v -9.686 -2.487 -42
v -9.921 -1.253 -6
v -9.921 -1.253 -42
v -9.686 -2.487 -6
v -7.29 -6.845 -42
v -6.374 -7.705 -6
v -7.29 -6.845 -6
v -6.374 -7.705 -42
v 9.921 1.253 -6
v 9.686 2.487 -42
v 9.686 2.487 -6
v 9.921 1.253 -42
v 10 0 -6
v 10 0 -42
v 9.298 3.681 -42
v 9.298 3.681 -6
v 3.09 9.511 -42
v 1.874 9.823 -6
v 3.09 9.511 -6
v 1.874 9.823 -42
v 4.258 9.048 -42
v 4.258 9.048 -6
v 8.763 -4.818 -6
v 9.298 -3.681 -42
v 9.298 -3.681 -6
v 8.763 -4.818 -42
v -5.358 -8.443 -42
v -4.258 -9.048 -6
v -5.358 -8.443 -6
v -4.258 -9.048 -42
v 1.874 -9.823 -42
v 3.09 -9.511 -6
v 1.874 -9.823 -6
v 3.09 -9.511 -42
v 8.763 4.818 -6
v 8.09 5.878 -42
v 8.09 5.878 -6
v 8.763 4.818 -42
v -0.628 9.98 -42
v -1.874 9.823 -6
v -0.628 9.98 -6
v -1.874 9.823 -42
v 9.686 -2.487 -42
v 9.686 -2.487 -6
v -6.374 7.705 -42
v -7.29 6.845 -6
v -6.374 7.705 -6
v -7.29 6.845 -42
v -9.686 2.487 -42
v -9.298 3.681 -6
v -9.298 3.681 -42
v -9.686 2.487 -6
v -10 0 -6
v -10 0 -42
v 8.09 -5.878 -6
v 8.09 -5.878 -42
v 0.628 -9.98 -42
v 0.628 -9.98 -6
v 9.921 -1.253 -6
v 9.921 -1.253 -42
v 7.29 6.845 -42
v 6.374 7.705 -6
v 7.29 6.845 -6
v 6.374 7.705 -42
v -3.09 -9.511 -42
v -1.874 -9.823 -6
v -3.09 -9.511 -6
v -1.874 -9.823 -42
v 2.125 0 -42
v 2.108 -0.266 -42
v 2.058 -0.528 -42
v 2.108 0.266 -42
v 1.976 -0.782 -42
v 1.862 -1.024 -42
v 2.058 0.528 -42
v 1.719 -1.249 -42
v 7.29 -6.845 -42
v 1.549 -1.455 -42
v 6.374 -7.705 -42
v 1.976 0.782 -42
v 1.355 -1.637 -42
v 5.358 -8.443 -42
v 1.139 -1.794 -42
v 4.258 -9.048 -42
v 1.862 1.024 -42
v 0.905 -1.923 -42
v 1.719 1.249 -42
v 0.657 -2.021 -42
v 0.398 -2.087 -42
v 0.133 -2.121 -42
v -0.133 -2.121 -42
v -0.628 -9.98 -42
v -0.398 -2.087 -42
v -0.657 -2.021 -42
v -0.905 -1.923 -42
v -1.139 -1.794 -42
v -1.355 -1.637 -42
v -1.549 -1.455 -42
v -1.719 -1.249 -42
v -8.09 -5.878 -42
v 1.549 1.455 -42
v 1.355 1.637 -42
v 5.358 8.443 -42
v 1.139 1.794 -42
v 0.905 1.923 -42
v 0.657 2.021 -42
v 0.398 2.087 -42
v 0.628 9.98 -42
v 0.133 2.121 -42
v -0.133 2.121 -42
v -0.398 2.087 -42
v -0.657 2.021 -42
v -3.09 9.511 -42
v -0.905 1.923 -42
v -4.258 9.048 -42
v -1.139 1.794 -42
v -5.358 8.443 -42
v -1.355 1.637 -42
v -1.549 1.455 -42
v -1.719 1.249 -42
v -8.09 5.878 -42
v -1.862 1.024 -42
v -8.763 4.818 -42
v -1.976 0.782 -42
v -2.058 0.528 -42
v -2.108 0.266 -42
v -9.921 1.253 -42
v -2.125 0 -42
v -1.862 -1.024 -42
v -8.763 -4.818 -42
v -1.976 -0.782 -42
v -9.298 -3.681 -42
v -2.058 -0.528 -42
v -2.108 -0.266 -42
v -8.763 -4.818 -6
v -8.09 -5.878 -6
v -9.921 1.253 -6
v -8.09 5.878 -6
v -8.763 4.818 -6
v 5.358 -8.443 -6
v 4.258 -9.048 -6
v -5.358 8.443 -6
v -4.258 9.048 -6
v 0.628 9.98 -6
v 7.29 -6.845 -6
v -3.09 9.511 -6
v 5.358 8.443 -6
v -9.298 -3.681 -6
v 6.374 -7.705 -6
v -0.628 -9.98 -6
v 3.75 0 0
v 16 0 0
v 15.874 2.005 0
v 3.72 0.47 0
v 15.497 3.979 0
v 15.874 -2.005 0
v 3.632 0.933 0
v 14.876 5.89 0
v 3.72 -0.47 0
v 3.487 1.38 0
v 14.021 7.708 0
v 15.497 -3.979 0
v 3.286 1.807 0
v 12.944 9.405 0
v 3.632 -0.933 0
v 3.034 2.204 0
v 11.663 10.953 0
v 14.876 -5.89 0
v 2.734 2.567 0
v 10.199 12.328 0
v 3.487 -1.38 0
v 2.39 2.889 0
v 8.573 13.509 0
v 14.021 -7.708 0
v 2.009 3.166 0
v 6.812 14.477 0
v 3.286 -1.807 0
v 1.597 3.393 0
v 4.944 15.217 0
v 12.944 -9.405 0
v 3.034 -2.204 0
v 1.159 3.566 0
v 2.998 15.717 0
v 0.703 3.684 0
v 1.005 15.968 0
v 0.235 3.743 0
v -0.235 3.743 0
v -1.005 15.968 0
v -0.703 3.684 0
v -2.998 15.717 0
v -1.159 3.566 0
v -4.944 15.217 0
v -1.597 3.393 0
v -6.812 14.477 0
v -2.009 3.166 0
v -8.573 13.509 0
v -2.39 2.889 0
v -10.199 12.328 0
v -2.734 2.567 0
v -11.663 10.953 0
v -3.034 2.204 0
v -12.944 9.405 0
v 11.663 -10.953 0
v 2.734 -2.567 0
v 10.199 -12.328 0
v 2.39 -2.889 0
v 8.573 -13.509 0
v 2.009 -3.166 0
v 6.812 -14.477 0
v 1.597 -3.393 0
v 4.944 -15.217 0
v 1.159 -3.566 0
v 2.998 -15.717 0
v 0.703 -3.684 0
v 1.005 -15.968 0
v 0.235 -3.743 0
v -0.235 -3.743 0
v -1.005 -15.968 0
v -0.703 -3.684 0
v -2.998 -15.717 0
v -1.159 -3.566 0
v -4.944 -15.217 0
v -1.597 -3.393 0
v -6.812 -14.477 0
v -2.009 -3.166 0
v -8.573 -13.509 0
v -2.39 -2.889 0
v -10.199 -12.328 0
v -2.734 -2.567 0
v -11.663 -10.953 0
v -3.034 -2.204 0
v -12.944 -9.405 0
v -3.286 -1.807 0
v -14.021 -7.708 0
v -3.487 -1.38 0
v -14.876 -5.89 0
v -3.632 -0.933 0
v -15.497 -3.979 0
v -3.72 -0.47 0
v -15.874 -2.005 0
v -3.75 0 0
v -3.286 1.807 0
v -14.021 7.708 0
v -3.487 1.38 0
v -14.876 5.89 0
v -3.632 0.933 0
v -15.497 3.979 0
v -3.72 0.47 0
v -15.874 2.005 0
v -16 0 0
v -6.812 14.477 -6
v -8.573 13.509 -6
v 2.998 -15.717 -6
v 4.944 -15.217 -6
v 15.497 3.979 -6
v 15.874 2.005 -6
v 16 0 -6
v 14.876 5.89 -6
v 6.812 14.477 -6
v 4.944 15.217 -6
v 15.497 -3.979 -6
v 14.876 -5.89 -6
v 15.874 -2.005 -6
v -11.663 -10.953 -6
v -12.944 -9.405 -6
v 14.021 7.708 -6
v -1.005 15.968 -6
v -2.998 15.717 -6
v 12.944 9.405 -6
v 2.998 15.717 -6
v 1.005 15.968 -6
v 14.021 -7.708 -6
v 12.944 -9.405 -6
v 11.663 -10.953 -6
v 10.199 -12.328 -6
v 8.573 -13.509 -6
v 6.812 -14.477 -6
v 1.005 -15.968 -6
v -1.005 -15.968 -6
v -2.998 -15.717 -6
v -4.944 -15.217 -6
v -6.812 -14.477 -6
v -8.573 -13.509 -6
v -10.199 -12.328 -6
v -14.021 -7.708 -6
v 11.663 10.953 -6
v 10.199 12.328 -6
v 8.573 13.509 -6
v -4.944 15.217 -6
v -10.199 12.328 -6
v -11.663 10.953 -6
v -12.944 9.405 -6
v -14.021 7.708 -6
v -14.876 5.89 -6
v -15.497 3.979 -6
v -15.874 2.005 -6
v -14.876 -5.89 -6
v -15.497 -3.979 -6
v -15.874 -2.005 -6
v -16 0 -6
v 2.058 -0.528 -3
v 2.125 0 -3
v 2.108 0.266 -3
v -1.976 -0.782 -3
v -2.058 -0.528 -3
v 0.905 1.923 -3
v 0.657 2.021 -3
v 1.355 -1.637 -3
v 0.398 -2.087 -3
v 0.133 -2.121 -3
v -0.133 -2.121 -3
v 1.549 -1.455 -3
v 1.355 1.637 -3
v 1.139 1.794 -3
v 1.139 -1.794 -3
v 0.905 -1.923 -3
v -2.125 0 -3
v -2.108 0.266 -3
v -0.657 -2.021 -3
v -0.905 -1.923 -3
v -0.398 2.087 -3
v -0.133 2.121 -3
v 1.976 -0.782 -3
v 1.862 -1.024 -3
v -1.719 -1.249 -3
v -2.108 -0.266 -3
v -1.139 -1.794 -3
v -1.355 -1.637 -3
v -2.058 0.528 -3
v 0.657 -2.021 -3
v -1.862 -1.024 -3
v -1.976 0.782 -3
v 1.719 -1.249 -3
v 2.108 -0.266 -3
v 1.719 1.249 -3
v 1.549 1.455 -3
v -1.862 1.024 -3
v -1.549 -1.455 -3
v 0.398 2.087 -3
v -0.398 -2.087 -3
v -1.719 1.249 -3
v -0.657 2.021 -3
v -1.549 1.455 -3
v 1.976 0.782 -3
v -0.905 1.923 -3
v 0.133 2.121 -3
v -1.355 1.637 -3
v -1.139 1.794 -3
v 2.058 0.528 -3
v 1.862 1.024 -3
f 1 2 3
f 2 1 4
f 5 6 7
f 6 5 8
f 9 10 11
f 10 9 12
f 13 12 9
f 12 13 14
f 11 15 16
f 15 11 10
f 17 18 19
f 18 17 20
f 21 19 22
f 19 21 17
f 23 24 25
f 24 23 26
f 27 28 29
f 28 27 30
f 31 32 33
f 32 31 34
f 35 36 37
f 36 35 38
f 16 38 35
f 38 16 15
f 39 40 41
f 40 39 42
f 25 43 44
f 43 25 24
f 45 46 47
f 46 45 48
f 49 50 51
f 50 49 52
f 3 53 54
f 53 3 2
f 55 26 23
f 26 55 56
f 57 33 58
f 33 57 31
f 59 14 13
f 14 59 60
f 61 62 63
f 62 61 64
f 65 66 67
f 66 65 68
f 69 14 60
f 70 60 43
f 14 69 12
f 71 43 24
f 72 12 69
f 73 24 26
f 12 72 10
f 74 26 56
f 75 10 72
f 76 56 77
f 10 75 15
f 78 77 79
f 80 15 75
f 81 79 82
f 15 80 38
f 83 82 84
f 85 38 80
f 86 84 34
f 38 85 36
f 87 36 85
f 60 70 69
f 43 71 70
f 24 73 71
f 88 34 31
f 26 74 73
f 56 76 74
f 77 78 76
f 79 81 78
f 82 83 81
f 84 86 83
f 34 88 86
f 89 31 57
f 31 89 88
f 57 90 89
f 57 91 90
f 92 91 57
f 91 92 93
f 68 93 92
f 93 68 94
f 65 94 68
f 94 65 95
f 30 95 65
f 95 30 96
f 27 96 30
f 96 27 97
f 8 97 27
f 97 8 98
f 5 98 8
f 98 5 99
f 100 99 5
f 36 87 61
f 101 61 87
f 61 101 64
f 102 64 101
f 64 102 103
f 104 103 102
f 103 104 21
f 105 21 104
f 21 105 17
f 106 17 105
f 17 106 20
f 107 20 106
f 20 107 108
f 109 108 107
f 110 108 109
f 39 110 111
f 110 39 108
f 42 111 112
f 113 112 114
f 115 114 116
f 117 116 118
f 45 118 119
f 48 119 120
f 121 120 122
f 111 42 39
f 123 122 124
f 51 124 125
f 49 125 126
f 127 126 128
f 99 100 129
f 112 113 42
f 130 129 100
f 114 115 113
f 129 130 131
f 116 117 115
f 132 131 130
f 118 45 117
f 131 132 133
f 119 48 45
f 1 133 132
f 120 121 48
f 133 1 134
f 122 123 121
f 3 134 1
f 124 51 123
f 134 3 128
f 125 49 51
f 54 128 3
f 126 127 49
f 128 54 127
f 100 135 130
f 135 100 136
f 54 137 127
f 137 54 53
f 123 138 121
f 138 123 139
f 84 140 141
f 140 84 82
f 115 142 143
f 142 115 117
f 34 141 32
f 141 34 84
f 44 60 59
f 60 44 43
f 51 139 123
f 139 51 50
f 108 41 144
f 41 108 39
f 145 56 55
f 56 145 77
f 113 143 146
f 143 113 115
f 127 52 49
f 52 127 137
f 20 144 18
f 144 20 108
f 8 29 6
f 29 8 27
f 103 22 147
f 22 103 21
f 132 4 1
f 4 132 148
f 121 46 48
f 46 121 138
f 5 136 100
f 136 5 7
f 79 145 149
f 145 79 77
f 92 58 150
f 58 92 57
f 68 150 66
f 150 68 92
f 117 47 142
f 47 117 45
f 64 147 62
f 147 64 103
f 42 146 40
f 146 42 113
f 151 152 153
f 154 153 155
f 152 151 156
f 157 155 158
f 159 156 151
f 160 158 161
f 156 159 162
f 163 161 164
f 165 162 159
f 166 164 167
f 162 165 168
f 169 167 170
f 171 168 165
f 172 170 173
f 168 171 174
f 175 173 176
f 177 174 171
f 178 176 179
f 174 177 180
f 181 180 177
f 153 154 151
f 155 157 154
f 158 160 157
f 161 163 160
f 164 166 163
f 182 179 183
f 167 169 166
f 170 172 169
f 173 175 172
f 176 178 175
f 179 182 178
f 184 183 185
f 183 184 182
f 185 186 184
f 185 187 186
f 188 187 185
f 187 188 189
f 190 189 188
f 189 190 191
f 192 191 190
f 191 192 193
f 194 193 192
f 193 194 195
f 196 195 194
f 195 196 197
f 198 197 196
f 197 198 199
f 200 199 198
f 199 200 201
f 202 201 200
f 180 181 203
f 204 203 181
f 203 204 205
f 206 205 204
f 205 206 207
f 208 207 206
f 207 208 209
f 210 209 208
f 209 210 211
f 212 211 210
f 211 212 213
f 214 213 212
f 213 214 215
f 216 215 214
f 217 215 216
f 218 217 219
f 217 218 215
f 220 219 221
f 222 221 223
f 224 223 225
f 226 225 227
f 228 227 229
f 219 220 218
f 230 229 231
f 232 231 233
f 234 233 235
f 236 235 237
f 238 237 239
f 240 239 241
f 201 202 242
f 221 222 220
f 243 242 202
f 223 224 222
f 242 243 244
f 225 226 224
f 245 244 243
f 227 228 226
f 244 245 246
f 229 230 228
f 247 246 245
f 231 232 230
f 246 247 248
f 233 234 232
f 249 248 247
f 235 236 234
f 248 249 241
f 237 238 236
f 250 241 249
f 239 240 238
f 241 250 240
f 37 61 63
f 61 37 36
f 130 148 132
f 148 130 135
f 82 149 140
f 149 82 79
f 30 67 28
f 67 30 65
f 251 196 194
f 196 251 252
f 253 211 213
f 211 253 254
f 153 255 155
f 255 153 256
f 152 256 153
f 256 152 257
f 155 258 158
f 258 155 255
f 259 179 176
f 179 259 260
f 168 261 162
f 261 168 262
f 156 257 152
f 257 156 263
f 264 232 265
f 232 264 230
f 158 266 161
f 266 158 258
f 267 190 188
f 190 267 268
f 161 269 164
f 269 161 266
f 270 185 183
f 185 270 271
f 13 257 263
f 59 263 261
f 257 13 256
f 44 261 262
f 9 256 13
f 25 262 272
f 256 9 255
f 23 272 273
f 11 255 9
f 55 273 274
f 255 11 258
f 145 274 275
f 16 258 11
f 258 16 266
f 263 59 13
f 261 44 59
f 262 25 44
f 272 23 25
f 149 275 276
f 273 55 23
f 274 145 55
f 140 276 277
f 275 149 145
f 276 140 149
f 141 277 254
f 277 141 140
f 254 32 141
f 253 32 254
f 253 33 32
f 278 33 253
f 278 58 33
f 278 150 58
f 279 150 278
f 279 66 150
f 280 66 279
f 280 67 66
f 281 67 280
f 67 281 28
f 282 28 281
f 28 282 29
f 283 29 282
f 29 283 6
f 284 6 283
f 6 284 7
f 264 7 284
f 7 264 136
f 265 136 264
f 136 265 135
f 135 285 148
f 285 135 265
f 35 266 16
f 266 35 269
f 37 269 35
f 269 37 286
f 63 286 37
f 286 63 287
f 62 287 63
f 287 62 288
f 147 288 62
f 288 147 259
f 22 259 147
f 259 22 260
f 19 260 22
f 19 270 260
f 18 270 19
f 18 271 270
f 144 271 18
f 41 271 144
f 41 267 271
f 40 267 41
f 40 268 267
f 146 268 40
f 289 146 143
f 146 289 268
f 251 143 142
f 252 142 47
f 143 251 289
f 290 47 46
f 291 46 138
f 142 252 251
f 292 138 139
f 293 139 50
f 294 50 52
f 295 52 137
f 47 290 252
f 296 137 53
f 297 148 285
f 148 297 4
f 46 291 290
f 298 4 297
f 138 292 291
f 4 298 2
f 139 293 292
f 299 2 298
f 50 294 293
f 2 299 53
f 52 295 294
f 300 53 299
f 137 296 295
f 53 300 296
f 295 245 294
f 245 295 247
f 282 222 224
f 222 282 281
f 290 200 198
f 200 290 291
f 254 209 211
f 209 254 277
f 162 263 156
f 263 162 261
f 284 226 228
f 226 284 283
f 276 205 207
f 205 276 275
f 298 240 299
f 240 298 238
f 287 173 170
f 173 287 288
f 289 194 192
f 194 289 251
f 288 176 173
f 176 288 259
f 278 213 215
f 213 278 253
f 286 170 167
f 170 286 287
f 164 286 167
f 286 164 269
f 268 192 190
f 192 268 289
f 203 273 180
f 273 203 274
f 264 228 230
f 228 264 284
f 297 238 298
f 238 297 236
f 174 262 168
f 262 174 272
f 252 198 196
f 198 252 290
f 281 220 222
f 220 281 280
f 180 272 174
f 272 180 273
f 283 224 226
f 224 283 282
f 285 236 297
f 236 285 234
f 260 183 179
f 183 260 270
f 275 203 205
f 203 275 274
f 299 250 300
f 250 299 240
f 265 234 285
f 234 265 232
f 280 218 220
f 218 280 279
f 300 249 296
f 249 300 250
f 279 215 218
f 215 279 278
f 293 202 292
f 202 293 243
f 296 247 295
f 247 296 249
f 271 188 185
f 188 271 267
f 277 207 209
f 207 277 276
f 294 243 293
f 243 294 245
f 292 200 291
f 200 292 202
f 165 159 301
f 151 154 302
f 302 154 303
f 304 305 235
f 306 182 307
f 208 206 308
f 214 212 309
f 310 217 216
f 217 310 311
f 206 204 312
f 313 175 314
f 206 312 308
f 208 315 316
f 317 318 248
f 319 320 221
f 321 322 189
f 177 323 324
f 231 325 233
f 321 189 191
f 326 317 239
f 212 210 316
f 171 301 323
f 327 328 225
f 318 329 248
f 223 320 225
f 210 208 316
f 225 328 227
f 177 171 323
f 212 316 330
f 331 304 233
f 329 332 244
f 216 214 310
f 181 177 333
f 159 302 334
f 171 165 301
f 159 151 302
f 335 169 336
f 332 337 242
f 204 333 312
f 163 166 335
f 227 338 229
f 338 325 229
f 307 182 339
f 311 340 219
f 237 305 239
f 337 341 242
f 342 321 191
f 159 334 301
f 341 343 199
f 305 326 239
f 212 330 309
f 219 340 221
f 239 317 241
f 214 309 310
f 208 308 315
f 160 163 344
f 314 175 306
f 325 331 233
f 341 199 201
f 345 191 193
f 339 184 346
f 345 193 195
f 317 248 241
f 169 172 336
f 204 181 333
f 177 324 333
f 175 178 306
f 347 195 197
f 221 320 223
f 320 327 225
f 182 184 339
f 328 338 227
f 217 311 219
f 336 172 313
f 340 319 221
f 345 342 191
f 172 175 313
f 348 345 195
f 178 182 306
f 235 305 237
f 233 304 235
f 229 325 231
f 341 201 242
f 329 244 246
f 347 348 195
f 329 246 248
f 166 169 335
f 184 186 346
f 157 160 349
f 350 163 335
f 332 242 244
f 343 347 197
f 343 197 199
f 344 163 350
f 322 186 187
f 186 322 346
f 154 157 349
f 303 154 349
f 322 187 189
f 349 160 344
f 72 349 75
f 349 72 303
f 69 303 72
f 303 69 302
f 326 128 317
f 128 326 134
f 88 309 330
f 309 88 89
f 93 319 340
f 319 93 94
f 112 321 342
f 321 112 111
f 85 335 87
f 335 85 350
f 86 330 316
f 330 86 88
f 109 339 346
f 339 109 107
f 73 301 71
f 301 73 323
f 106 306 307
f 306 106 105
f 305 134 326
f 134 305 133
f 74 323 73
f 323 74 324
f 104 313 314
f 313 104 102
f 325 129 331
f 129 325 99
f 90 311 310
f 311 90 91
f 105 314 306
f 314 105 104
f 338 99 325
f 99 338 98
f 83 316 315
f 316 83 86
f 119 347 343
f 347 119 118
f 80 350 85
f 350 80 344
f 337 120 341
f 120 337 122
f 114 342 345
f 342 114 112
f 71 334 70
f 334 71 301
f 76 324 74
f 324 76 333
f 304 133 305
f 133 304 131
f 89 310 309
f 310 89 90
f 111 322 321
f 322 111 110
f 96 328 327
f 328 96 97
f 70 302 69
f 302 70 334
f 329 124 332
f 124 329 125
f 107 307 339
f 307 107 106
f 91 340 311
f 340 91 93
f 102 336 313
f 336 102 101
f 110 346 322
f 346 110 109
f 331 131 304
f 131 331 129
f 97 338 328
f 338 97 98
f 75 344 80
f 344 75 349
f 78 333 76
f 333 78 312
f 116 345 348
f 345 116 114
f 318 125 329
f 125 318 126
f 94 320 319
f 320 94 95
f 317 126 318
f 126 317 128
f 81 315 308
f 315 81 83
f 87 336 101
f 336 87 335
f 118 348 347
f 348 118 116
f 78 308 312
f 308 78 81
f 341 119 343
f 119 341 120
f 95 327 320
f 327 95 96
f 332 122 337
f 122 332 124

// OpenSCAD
$fn = 50;


difference() {
	union() {
		translate(v = [0, 0, -42.0000000000]) {
			cylinder(h = 42, r = 10.0000000000);
		}
		translate(v = [0, 0, -6.0000000000]) {
			cylinder(h = 6, r = 16.0000000000);
		}
	}
	union() {
		translate(v = [0, 0, 0]) {
			rotate(a = [0, 0, 0]) {
				difference() {
					union() {
						#translate(v = [0, 0, -42.0000000000]) {
							cylinder(h = 42, r = 2.0000000000);
						}
						#translate(v = [0, 0, -3]) {
							cylinder(h = 3, r = 10.0000000000, r1 = 2.1250000000, r2 = 3.7500000000);
						}
						#translate(v = [0, 0, -42.0000000000]) {
							cylinder(h = 42, r = 2.1250000000);
						}
						#translate(v = [0, 0, -42.0000000000]) {
							cylinder(h = 42, r = 2.0000000000);
						}
					}
					union();
				}
			}
		}
	}
}
